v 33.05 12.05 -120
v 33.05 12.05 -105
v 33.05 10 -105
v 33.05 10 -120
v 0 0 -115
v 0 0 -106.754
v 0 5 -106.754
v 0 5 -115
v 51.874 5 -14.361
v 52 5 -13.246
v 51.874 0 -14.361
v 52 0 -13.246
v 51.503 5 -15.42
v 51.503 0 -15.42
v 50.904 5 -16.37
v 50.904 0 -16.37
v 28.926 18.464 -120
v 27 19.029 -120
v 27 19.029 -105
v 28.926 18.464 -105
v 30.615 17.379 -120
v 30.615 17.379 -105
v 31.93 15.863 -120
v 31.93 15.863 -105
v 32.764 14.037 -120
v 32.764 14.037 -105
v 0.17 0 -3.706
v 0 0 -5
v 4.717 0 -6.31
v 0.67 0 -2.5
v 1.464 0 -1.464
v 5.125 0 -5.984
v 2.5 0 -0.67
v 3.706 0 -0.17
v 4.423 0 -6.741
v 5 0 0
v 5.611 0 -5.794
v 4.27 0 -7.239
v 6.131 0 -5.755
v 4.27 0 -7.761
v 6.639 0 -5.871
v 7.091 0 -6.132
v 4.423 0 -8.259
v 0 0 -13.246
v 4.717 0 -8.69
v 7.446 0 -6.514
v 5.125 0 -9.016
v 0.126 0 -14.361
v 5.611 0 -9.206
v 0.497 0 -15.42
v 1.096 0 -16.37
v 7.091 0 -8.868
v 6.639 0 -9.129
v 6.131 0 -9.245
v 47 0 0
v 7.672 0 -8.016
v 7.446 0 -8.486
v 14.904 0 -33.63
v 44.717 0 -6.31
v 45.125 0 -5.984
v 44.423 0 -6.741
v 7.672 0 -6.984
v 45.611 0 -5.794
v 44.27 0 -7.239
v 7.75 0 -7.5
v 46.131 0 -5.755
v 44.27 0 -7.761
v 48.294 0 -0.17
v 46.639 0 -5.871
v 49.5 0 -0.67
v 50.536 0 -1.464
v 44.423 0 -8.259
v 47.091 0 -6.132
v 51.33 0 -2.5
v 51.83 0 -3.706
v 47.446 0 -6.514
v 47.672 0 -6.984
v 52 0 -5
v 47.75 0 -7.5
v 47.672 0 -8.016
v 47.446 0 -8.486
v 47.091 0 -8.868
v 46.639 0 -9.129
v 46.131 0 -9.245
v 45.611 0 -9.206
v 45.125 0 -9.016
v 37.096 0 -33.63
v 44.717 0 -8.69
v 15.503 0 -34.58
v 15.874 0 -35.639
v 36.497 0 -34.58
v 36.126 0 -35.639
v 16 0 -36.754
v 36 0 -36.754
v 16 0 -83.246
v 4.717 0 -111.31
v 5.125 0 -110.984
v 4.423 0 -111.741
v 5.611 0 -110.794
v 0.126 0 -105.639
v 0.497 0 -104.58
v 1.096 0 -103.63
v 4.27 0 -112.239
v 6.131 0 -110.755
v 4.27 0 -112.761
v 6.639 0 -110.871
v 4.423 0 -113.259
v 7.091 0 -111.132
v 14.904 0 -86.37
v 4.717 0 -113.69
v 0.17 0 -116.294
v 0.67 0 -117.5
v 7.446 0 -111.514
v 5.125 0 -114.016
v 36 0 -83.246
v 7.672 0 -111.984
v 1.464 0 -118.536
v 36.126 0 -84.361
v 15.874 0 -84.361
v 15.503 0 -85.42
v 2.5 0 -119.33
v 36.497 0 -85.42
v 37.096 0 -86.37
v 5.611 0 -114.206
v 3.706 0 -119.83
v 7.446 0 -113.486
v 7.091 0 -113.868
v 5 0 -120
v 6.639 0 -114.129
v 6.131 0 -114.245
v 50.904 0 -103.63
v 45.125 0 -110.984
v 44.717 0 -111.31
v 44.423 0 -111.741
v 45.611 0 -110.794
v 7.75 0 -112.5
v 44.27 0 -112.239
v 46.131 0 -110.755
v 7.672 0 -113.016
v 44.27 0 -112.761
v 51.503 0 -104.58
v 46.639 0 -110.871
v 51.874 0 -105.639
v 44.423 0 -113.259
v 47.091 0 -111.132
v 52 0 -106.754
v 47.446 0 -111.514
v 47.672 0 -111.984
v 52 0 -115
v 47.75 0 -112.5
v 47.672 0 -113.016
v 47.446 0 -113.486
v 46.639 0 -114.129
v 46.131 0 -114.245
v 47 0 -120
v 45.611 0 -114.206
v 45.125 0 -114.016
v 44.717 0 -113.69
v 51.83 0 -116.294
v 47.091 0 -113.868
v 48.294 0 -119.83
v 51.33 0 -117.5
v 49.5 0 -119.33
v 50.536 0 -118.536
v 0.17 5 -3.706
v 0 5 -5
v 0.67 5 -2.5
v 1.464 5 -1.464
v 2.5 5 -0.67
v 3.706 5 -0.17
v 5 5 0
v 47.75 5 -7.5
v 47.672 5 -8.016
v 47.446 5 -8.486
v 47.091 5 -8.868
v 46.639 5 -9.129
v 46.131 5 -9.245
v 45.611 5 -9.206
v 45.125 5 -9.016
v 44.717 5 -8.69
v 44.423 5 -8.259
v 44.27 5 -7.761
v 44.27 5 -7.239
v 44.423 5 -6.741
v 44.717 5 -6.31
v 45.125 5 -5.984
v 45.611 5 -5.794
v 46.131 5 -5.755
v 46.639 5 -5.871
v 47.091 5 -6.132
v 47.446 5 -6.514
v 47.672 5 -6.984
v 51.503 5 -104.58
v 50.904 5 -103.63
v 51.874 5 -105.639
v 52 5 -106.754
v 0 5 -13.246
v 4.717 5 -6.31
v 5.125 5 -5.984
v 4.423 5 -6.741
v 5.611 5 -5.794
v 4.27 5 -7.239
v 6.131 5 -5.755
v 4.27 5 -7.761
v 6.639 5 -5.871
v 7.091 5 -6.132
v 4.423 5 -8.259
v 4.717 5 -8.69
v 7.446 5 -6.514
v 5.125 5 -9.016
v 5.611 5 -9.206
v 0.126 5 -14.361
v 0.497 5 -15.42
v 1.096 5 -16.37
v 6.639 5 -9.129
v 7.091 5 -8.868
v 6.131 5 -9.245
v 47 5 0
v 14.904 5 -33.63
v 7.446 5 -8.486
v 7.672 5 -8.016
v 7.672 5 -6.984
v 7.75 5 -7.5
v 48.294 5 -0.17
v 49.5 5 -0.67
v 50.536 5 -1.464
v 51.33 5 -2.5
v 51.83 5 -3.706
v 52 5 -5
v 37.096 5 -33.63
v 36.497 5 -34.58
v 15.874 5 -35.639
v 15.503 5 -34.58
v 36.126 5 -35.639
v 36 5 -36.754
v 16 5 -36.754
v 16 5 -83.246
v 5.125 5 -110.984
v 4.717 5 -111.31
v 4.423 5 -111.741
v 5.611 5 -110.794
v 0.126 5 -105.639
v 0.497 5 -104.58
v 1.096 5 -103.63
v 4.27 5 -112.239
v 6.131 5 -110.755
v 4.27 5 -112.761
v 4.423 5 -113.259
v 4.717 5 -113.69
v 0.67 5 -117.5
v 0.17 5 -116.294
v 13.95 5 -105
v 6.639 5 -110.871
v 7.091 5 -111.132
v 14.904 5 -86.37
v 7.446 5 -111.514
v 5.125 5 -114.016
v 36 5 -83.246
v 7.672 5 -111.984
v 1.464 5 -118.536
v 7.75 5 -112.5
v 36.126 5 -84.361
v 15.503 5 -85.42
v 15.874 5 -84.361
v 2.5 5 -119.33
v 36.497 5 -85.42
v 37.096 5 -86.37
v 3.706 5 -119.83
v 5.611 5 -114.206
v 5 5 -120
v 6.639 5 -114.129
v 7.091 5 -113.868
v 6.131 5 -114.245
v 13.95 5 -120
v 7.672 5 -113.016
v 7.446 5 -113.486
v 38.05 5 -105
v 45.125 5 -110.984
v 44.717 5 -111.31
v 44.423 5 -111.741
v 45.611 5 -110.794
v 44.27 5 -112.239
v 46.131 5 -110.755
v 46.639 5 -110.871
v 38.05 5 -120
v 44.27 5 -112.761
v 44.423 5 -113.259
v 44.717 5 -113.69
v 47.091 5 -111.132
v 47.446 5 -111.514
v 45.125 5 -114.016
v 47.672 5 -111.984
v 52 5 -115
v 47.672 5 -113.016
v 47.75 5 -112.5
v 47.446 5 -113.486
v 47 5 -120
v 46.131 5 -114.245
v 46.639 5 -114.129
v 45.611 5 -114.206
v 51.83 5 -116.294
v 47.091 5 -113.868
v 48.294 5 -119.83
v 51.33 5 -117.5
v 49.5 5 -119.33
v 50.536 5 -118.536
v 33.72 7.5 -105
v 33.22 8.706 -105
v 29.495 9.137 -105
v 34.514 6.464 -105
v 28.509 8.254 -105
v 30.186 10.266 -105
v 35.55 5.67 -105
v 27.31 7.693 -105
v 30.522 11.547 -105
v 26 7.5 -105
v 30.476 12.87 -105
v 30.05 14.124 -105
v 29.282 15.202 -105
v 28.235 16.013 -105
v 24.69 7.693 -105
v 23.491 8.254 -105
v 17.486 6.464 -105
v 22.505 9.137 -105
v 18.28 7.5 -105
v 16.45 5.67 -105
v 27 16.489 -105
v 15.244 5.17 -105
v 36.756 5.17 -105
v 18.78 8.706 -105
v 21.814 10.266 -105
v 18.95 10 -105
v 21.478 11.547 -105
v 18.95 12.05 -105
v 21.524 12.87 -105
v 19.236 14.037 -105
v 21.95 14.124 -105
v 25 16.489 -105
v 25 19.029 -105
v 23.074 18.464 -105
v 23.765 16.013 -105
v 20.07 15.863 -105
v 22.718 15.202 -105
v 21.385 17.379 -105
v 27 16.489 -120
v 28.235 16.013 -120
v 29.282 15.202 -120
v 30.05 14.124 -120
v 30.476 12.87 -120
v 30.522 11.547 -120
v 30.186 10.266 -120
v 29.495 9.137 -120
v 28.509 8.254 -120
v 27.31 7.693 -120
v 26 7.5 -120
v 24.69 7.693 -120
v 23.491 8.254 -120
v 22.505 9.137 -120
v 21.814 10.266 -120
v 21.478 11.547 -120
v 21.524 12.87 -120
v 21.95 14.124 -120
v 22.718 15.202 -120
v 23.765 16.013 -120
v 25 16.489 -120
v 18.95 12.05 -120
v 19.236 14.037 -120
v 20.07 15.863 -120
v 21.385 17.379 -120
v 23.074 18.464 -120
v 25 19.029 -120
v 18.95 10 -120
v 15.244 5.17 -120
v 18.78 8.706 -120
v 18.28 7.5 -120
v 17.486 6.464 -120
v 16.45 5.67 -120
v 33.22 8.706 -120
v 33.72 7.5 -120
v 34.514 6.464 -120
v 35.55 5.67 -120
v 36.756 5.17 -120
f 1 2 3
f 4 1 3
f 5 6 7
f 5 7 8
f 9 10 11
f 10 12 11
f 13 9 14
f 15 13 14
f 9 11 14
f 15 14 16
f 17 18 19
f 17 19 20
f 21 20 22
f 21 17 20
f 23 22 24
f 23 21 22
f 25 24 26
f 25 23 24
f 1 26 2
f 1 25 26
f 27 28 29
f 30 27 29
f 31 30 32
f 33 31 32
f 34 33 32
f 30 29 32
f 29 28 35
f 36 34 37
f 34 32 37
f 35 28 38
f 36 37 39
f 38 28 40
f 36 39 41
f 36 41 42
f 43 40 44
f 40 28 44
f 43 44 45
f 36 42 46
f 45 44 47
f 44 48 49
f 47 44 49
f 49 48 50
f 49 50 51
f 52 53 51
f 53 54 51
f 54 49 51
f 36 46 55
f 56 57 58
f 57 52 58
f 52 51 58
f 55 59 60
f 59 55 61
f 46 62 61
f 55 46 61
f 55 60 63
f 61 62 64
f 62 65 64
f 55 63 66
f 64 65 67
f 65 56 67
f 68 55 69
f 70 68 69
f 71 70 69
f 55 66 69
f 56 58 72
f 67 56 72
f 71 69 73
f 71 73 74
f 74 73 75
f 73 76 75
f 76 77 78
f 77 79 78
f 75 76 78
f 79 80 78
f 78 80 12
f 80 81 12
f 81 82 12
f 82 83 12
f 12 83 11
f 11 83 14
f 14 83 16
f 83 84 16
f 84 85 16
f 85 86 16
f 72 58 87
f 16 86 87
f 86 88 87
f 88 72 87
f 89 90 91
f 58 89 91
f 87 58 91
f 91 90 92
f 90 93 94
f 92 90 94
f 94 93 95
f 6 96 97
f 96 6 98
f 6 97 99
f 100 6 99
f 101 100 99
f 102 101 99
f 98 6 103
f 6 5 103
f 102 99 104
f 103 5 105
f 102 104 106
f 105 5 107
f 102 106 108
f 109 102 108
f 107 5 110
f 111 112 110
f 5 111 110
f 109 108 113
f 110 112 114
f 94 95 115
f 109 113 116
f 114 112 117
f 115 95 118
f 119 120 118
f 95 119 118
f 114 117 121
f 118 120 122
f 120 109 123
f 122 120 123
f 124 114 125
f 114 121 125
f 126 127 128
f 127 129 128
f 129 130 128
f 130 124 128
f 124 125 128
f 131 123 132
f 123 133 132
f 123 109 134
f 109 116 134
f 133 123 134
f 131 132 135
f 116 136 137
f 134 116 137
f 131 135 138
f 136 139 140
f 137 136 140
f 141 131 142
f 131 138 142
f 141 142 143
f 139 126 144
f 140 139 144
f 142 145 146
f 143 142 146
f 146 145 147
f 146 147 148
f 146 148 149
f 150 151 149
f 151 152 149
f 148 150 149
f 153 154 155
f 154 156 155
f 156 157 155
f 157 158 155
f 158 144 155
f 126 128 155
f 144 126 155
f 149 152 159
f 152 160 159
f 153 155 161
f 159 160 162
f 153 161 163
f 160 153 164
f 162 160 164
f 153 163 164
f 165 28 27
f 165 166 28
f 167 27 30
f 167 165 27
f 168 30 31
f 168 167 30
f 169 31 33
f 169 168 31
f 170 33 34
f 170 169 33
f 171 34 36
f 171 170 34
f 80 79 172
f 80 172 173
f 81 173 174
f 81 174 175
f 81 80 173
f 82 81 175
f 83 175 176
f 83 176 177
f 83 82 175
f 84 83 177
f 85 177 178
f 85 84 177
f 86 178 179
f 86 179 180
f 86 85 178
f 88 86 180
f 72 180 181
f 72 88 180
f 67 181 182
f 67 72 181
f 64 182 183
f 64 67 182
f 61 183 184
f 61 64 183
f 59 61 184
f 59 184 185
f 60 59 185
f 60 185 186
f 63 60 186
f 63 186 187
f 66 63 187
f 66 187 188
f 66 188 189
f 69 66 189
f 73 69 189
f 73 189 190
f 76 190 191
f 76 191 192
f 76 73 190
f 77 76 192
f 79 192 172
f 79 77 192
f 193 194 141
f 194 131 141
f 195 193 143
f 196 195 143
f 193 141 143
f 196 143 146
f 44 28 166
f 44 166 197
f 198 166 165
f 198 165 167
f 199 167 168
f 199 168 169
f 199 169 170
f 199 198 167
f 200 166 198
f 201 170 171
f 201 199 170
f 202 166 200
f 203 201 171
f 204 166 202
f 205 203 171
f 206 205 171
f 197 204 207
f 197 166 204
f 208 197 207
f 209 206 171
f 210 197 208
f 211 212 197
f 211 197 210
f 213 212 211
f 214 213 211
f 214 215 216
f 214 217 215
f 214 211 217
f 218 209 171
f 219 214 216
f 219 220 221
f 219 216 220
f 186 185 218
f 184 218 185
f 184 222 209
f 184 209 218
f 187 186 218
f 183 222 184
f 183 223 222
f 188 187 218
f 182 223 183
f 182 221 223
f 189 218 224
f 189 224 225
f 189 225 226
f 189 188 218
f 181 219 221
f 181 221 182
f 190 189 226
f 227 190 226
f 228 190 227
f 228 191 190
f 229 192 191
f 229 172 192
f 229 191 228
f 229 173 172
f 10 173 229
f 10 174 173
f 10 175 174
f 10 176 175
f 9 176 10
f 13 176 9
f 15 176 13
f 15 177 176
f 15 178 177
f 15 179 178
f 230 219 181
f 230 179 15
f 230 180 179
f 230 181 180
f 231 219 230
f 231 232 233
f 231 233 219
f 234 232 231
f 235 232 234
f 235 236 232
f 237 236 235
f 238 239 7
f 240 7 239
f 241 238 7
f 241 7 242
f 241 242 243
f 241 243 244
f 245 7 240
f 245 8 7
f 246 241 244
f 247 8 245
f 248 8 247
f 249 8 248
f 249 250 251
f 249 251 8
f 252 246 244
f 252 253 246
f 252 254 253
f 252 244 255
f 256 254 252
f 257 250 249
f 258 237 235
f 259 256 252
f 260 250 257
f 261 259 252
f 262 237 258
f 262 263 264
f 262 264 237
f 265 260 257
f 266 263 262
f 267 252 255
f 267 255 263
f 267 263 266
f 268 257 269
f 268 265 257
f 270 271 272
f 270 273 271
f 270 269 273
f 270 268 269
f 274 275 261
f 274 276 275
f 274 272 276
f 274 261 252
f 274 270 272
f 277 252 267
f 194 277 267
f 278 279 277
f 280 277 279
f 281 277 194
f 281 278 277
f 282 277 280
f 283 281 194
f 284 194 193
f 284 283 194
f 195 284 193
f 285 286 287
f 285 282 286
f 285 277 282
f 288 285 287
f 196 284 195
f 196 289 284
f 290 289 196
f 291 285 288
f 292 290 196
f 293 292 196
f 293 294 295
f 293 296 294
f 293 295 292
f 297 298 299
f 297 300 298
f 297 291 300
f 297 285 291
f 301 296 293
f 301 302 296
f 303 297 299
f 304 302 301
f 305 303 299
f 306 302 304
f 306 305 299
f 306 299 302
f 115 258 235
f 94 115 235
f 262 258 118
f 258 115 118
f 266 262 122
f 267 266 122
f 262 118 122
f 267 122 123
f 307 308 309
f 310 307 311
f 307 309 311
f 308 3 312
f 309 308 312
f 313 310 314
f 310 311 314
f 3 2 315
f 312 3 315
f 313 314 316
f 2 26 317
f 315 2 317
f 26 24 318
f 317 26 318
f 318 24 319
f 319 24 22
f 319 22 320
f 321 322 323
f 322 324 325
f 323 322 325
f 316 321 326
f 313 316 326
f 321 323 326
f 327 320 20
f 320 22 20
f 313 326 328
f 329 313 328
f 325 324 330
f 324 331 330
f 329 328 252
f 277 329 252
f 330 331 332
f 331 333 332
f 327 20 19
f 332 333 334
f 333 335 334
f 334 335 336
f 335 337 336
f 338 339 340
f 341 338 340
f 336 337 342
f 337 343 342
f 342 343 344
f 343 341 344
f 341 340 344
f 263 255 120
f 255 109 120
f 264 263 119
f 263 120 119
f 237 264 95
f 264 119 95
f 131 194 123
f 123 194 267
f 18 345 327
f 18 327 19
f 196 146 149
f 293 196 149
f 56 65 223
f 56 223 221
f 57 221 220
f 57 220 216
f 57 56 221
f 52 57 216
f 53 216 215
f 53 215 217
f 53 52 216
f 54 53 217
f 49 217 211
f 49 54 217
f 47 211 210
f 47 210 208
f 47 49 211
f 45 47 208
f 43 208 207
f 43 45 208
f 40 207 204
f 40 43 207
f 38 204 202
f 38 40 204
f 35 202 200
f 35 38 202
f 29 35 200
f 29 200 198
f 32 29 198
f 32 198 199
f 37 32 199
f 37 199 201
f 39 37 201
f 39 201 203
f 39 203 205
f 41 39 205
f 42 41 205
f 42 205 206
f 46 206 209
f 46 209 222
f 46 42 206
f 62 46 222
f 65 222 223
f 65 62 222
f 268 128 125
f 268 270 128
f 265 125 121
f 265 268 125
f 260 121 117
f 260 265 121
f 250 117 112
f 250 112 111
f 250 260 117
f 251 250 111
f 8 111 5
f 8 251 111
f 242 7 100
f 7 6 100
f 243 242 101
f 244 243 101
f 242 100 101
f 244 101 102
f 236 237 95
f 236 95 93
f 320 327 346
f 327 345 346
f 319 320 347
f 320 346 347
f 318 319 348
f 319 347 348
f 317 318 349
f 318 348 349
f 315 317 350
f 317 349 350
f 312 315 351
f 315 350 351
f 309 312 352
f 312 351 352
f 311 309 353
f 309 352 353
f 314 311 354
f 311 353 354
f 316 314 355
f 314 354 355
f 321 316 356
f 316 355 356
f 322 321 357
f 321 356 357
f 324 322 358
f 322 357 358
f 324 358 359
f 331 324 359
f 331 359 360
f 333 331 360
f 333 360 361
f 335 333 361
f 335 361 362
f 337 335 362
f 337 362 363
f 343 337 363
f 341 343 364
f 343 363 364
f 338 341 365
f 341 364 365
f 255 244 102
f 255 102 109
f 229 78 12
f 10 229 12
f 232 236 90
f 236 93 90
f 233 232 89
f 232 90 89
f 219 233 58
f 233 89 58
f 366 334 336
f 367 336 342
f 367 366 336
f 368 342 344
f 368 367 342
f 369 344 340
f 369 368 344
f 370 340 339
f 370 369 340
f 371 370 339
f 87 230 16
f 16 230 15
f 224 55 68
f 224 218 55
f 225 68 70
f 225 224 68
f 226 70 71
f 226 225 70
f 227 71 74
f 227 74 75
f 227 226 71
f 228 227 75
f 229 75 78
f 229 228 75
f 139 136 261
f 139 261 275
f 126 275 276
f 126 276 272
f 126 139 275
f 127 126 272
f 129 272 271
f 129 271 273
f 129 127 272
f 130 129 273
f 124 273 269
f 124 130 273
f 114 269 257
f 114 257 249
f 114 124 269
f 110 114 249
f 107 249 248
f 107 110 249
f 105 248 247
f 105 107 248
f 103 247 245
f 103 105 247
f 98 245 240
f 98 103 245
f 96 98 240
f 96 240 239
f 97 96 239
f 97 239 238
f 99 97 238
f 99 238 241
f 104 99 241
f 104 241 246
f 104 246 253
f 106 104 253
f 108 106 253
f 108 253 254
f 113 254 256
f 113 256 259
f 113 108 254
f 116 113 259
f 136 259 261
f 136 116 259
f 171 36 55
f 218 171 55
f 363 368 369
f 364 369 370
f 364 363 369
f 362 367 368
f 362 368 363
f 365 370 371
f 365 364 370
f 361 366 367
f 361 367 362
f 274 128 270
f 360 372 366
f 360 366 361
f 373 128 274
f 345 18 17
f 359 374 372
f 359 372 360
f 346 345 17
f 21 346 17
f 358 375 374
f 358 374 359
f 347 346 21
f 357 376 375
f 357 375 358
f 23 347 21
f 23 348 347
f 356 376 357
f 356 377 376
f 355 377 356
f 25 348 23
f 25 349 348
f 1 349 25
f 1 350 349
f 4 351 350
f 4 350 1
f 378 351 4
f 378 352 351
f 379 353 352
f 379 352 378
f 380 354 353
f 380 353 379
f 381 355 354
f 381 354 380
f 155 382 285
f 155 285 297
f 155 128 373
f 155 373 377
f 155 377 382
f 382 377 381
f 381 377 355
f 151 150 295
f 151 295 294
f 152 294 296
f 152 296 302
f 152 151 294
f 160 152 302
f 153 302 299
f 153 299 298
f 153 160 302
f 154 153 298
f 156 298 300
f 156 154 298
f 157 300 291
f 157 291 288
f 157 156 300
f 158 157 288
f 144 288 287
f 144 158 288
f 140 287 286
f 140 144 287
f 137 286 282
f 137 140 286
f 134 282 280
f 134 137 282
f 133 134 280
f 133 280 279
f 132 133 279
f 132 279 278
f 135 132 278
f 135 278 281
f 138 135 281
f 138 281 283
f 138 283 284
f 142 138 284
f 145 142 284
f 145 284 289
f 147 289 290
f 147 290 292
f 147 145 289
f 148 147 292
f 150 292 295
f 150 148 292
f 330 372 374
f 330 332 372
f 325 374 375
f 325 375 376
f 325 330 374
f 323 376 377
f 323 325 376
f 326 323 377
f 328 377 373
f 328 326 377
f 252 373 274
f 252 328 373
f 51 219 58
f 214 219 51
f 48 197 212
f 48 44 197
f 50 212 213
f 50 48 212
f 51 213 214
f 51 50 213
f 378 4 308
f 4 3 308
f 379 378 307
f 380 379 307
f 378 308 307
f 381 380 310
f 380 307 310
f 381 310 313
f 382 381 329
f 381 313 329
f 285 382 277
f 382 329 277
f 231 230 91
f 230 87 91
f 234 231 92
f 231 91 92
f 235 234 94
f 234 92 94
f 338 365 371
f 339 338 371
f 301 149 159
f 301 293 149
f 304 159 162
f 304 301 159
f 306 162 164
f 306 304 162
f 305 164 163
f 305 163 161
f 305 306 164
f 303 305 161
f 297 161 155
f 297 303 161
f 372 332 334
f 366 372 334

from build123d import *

# Parameters (mm, degrees)
SKETCH2_W           = 52
SKETCH2_H           = 120
SKETCH2_R           = 1.75
BOSS_EXTRUDE1_DEPTH = 5
CUT_EXTRUDE1_DEPTH  = 6
SKETCH4_R           = 4.55
BOSS_EXTRUDE2_DEPTH = 15
SKETCH5_W           = 2
SKETCH5_H           = 2.611250176
CUT_EXTRUDE2_DEPTH  = 121
FILLET1_R           = 5


with BuildPart() as part:
    # Sketch2 → Boss-Extrude1 (new body)
    with BuildSketch(Plane(origin=(0, 0, 0), x_dir=(1, 0, 0), z_dir=(0, 1, 0))):
        with Locations((26, 60)):
            Rectangle(SKETCH2_W, SKETCH2_H)
        with Locations((6, 7.5)):
            Circle(SKETCH2_R, mode=Mode.SUBTRACT)
        with Locations((46, 7.5)):
            Circle(SKETCH2_R, mode=Mode.SUBTRACT)
        with Locations((6, 112.5)):
            Circle(SKETCH2_R, mode=Mode.SUBTRACT)
        with Locations((46, 112.5)):
            Circle(SKETCH2_R, mode=Mode.SUBTRACT)
    extrude(amount=BOSS_EXTRUDE1_DEPTH)

    # Sketch3 → Cut-Extrude1 (cut, through all)
    with BuildSketch(Plane(origin=(0, 5, 0), x_dir=(1, 0, 0), z_dir=(0, 1, 0))):
        Polygon((0, 105), (16, 85), (16, 35), (0, 15), align=None)
        Polygon((52, 105), (36, 85), (36, 35), (52, 15), align=None)
    extrude(amount=-CUT_EXTRUDE1_DEPTH, mode=Mode.SUBTRACT)

    # Sketch4 → Boss-Extrude2 (add)
    with BuildSketch(Plane(origin=(0, 0, -120), x_dir=(-1, 0, 0), z_dir=(0, 0, -1))):
        with BuildLine():
            Line((-33.05, 12.05), (-33.05, 5))
            Line((-33.05, 5), (-18.95, 5))
            Line((-18.95, 5), (-18.95, 12.05))
            ThreePointArc((-18.95, 12.05), (-26, 19.1), (-33.05, 12.05))
        make_face()
        with Locations((-26, 12.05)):
            Circle(SKETCH4_R, mode=Mode.SUBTRACT)
    extrude(amount=-BOSS_EXTRUDE2_DEPTH)

    # Sketch5 → Cut-Extrude2 (cut, through all)
    with BuildSketch(Plane(origin=(0, 0, -120), x_dir=(-1, 0, 0), z_dir=(0, 0, -1))):
        with Locations((-26, 17.794374912)):
            Rectangle(SKETCH5_W, SKETCH5_H)
    extrude(amount=-CUT_EXTRUDE2_DEPTH, mode=Mode.SUBTRACT)

    # Fillet1
    fillet1_edges = [part.edges().sort_by_distance(p)[0] for p in [
        (0, 2.5, -15),
        (0, 2.5, -105),
        (16, 2.5, -85),
        (16, 2.5, -35),
        (52, 2.5, -105),
        (52, 2.5, -15),
        (36, 2.5, -35),
        (36, 2.5, -85),
        (18.95, 5, -112.5),
        (33.05, 5, -112.5),
        (0, 2.5, -120),
        (52, 2.5, -120),
        (52, 2.5, 0),
        (0, 2.5, 0),
    ]]
    fillet(fillet1_edges, radius=FILLET1_R)


solid = part.part
